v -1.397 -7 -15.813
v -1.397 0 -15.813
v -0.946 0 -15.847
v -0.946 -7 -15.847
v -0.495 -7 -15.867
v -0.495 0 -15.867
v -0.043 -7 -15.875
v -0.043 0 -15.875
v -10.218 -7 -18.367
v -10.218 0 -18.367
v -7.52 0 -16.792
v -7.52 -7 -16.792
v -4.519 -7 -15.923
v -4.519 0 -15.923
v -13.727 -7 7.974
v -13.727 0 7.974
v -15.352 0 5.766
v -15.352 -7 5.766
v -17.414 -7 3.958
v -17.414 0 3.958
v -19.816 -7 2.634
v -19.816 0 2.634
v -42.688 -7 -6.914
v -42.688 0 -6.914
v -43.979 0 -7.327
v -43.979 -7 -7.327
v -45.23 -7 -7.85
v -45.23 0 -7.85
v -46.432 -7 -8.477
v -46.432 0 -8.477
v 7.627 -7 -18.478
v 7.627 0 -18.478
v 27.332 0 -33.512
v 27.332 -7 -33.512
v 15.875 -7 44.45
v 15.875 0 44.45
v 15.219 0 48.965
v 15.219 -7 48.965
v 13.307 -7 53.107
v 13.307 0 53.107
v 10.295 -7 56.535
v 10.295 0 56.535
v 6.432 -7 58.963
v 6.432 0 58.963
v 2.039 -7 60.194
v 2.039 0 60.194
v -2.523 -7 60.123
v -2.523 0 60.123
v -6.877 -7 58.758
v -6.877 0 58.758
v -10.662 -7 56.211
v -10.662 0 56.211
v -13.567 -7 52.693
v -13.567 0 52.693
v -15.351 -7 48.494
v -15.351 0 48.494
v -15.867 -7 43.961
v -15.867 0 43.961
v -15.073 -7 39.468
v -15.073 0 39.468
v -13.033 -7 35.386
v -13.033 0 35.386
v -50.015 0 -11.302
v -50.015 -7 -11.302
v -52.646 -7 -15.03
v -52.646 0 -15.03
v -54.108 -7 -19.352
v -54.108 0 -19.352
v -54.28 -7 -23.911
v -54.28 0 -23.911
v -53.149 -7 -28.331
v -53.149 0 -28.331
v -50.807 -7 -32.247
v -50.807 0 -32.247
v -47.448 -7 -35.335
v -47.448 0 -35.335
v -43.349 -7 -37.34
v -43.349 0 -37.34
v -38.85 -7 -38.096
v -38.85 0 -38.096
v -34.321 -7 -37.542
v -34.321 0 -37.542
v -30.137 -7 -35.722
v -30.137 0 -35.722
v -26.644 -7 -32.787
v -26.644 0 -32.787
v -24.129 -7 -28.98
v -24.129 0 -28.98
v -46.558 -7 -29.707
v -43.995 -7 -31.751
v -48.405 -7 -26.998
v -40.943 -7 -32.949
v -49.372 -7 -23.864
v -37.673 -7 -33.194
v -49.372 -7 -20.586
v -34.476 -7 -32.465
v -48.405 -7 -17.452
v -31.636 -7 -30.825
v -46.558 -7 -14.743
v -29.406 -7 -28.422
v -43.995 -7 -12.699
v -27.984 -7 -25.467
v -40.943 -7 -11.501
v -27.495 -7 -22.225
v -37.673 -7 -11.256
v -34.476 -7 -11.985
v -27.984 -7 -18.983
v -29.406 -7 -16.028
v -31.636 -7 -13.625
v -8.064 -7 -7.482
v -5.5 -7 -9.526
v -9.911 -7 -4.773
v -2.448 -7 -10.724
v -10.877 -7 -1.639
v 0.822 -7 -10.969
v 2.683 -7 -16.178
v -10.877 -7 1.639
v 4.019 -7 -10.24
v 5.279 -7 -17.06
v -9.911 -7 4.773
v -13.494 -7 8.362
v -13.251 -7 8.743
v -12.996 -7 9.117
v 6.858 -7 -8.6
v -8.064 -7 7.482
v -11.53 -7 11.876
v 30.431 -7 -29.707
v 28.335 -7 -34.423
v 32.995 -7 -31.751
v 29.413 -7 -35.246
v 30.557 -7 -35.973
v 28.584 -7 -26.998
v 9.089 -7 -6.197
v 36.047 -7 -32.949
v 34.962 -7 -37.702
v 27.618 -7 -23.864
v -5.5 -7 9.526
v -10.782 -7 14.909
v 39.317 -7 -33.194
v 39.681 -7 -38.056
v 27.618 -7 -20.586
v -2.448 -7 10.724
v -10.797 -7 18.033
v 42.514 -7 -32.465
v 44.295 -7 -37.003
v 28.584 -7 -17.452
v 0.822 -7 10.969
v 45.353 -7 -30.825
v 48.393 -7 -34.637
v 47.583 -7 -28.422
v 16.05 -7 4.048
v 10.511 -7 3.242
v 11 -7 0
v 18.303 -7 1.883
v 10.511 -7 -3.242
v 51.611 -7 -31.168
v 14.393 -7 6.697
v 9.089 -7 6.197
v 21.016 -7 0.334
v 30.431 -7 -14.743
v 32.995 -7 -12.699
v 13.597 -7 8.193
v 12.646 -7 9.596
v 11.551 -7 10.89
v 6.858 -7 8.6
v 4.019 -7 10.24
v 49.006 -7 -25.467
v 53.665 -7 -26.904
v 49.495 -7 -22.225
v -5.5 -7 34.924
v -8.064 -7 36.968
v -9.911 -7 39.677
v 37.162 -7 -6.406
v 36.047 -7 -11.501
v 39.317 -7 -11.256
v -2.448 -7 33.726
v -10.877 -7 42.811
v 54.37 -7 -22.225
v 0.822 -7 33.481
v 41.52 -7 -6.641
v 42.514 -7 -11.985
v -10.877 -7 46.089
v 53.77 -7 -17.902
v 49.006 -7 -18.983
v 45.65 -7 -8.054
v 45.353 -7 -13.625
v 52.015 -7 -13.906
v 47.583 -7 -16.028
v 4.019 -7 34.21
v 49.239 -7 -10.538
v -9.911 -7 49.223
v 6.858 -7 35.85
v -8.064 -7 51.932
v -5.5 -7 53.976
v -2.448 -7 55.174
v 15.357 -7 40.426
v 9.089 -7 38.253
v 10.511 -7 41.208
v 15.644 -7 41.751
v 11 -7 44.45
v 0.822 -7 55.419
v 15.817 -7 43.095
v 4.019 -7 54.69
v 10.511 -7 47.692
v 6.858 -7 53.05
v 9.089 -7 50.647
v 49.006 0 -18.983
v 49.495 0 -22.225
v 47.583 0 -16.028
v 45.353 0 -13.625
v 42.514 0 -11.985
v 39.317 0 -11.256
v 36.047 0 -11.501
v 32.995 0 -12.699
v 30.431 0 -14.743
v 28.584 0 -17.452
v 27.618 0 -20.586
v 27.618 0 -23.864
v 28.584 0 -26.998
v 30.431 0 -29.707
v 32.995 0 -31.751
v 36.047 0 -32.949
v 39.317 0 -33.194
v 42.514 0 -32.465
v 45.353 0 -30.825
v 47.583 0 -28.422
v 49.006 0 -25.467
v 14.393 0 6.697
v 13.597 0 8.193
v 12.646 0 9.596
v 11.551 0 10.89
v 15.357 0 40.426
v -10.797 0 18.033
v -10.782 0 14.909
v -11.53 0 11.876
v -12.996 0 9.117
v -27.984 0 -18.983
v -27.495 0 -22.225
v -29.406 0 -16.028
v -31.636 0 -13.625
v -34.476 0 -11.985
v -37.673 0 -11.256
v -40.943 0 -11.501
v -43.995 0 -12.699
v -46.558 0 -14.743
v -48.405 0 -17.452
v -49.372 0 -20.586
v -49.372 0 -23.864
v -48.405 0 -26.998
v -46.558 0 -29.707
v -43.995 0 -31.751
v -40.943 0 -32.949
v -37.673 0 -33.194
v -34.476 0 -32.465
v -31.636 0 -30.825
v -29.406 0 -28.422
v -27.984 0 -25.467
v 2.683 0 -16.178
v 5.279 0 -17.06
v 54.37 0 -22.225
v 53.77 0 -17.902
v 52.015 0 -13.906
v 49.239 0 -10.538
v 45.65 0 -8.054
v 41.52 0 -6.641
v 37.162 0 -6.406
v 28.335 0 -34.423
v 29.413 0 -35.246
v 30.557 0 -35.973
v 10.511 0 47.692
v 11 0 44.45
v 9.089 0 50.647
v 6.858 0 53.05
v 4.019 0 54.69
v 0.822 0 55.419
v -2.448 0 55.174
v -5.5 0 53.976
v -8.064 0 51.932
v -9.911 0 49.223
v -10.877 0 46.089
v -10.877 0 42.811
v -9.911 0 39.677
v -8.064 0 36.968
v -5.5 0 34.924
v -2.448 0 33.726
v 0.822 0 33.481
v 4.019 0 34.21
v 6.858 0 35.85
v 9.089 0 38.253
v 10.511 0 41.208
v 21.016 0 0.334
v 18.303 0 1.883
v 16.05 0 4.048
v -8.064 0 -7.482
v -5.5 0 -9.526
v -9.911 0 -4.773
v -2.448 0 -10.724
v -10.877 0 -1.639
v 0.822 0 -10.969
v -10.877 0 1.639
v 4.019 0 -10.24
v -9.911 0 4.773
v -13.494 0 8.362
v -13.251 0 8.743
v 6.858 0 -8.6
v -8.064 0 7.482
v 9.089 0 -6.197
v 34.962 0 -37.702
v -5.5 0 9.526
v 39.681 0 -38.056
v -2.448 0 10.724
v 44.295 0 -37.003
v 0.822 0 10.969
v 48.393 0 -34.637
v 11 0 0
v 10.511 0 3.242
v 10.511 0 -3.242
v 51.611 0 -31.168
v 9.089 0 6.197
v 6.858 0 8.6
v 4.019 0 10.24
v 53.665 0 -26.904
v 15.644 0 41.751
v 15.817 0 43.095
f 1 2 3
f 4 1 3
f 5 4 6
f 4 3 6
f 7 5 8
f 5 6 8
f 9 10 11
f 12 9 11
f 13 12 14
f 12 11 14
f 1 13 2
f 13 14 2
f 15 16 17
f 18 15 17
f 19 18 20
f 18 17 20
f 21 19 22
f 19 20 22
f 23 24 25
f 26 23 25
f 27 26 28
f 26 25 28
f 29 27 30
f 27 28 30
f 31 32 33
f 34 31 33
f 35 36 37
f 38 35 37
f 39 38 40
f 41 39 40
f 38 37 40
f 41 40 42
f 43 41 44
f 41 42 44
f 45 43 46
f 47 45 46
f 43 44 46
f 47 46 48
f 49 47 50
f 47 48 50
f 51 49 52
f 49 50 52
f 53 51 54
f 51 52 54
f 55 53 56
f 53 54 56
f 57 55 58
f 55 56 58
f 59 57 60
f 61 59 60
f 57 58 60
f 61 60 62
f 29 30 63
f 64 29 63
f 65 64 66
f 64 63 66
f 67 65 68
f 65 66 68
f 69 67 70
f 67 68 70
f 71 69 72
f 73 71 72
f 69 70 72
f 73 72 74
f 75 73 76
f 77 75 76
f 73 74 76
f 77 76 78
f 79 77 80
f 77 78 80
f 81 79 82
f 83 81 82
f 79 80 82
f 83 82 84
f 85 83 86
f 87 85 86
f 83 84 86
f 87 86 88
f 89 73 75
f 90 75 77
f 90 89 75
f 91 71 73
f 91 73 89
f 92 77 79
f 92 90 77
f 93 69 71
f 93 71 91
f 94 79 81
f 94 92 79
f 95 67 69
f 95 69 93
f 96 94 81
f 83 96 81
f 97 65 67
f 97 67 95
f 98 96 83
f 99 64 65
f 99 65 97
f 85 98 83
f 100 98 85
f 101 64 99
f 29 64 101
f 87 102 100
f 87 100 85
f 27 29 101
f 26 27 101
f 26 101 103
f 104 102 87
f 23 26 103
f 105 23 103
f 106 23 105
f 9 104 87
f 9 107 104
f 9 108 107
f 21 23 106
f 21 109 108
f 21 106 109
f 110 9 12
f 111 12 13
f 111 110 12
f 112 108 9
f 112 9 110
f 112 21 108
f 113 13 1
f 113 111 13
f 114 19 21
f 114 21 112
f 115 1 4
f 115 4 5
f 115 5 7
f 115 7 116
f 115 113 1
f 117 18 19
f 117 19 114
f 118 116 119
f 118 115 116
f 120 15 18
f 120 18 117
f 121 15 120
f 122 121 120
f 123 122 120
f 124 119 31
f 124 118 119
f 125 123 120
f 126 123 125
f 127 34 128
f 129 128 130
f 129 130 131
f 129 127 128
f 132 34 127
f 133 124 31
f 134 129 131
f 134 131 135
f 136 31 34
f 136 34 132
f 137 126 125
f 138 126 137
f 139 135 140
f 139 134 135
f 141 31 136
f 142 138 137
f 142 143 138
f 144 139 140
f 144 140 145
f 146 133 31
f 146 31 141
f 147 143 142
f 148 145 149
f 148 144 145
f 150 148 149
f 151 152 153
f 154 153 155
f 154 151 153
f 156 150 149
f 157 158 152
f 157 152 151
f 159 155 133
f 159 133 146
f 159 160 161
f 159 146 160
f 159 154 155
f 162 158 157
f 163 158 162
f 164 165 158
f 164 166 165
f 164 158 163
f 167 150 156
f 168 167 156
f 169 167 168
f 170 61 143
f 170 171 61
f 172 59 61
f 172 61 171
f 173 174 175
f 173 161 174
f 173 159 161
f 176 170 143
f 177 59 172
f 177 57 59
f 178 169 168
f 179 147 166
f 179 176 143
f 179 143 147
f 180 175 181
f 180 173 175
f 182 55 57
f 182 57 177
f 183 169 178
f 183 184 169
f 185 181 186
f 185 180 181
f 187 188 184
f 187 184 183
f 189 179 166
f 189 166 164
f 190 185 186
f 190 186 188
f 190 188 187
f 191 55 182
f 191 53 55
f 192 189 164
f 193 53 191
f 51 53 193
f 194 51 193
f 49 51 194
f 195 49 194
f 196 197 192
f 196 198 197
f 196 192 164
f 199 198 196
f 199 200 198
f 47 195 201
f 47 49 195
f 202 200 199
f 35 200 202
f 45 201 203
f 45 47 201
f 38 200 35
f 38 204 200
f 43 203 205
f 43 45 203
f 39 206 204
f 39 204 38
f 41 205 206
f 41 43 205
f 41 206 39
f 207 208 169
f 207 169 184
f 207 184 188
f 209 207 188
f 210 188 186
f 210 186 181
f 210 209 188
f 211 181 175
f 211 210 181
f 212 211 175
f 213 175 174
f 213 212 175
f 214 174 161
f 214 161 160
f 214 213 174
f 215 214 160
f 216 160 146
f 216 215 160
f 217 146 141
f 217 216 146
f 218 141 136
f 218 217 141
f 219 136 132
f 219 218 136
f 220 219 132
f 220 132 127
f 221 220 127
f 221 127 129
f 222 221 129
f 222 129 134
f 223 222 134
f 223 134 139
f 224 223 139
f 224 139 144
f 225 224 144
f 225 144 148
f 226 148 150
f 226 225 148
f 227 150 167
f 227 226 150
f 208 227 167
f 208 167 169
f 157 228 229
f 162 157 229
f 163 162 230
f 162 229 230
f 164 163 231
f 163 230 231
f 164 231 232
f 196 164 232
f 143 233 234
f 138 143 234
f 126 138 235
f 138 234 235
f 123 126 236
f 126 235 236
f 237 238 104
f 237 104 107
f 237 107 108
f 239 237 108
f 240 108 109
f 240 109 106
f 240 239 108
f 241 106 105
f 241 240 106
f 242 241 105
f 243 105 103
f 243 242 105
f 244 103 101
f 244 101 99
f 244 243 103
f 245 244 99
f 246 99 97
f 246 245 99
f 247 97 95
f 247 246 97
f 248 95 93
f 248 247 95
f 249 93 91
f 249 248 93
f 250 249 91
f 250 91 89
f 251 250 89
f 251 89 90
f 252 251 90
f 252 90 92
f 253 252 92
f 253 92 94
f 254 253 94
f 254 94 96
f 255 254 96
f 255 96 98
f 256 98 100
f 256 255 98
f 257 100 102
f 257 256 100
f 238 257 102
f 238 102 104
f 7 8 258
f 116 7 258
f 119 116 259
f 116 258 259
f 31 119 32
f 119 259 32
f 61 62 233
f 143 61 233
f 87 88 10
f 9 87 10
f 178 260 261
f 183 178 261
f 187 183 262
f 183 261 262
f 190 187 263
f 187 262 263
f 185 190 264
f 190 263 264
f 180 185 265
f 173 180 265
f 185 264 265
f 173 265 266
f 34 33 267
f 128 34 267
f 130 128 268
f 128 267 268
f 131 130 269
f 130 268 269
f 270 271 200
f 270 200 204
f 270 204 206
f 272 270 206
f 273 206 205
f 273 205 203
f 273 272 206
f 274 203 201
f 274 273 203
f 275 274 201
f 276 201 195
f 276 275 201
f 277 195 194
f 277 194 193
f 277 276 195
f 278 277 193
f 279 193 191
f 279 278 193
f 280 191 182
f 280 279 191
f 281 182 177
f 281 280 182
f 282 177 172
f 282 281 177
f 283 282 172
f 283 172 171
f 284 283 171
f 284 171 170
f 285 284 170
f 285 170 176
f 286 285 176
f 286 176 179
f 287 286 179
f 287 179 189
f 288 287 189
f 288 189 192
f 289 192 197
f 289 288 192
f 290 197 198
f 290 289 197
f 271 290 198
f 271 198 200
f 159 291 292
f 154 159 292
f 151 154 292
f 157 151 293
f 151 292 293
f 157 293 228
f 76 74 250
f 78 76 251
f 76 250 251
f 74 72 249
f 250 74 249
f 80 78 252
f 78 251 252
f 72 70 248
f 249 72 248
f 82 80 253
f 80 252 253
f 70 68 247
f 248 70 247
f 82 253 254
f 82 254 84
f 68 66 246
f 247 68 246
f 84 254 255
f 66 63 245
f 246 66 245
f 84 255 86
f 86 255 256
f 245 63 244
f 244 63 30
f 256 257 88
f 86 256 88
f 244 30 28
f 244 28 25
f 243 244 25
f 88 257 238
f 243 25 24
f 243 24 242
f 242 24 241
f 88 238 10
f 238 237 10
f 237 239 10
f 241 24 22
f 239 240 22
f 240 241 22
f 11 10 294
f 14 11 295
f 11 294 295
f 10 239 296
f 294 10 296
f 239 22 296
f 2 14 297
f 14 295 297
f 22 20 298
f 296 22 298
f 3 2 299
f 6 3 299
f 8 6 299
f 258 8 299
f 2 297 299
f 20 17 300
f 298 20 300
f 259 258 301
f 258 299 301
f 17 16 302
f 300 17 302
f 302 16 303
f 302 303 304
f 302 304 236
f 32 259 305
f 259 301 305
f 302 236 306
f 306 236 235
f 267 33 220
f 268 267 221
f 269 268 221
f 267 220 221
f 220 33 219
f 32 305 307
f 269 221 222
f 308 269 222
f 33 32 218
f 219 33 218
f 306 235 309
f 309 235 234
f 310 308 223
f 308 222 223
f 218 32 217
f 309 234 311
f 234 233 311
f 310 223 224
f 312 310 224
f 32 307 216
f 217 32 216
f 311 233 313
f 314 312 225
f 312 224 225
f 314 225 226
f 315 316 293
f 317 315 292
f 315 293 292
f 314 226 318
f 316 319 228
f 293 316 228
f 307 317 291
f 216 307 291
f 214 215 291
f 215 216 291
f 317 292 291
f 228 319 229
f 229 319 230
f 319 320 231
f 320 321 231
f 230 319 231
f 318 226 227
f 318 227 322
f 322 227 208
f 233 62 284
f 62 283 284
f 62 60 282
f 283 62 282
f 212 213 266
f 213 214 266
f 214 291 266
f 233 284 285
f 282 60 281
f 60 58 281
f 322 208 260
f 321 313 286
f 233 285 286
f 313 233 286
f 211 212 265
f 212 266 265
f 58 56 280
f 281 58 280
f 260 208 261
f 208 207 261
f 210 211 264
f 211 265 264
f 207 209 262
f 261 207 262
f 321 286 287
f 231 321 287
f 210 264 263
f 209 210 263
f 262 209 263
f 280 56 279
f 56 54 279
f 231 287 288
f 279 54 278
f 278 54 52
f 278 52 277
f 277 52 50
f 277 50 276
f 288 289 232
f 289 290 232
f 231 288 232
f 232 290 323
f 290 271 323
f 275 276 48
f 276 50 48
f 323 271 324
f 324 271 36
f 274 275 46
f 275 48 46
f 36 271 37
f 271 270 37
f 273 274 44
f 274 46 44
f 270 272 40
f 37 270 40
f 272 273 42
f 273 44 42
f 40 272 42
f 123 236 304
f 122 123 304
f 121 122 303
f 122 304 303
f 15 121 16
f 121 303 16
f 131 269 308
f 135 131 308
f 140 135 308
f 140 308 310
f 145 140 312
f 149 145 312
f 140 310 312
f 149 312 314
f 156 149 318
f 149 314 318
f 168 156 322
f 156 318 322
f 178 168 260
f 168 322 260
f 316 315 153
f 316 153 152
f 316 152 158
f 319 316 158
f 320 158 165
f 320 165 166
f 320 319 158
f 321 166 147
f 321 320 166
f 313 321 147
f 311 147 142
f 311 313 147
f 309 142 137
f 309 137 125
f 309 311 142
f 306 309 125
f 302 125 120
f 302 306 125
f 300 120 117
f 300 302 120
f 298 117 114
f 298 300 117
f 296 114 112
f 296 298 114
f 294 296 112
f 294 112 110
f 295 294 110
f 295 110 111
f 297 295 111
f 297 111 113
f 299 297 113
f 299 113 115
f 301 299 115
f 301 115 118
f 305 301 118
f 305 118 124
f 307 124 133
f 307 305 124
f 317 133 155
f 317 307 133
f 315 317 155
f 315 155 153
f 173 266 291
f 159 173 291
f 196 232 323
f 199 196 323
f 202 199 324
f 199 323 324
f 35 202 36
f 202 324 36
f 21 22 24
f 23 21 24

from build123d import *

# Parameters (mm, degrees)
F0_R     = 11
F1_DEPTH = 7


with BuildPart() as f1:
    # F0 (on Front) → F1 (new body)
    with BuildSketch(Plane.XZ):
        with BuildLine():
            ThreePointArc((-10.218251, -18.367249), (-6.0466, -16.265091), (-1.397113, -15.813403))
            ThreePointArc((-1.397113, -15.813403), (-0.720579, -15.858638), (-0.04273, -15.874942))
            ThreePointArc((-0.04273, -15.874942), (4.004964, -16.548747), (7.626532, -18.478019))
            Line((7.626532, -18.478019), (27.331615, -33.512077))
            ThreePointArc((27.331615, -33.512077), (23.570998, -16.812529), (37.162239, -6.406025))
            Line((37.162239, -6.406025), (21.01563, 0.33436))
            ThreePointArc((21.01563, 0.33436), (17.109282, 2.896038), (14.393365, 6.696766))
            ThreePointArc((14.393365, 6.696766), (13.14047, 8.907506), (11.550893, 10.890019))
            Line((11.550893, 10.890019), (15.356507, 40.42591))
            ThreePointArc((15.356507, 40.42591), (2.774582, 28.819347), (-13.033335, 35.386457))
            Line((-13.033335, 35.386457), (-10.797377, 18.03289))
            ThreePointArc((-10.797377, 18.03289), (-11.062681, 13.369055), (-12.996251, 9.116638))
            ThreePointArc((-12.996251, 9.116638), (-13.373693, 8.553359), (-13.726738, 7.974477))
            ThreePointArc((-13.726738, 7.974477), (-16.334117, 4.805974), (-19.8157, 2.634241))
            Line((-19.8157, 2.634241), (-42.688118, -6.913832))
            ThreePointArc((-42.688118, -6.913832), (-28.86552, -9.603907), (-22.619828, -22.225002))
            ThreePointArc((-22.619828, -22.225002), (-23.001689, -25.685967), (-24.128902, -28.980429))
            Line((-24.128902, -28.980429), (-10.218251, -18.367249))
        make_face()
        Circle(F0_R, mode=Mode.SUBTRACT)
        with BuildLine():
            ThreePointArc((-46.432329, -8.476849), (-49.23868, -33.911972), (-24.128902, -28.980429))
            ThreePointArc((-24.128902, -28.980429), (-23.001689, -25.685967), (-22.619828, -22.225002))
            ThreePointArc((-22.619828, -22.225002), (-28.86552, -9.603907), (-42.688118, -6.913832))
            Line((-42.688118, -6.913832), (-46.432329, -8.476849))
        make_face()
        with Locations((-38.494828, -22.225002)):
            Circle(F0_R, mode=Mode.SUBTRACT)
        with BuildLine():
            ThreePointArc((37.162239, -6.406025), (23.570998, -16.812529), (27.331615, -33.512077))
            Line((27.331615, -33.512077), (30.557333, -35.97315))
            ThreePointArc((30.557333, -35.97315), (46.432333, -35.973148), (54.369832, -22.224996))
            ThreePointArc((54.369832, -22.224996), (49.238684, -10.538026), (37.162239, -6.406025))
        make_face()
        with Locations((38.494832, -22.224996)):
            Circle(F0_R, mode=Mode.SUBTRACT)
        with BuildLine():
            Line((30.557333, -35.97315), (27.331615, -33.512077))
            ThreePointArc((27.331615, -33.512077), (28.865525, -34.846092), (30.557333, -35.97315))
        make_face()
        with BuildLine():
            ThreePointArc((-42.688118, -6.913832), (-44.610364, -7.575229), (-46.432329, -8.476849))
            Line((-46.432329, -8.476849), (-42.688118, -6.913832))
        make_face()
        with BuildLine():
            Line((15.875, 44.45), (15.356507, 40.42591))
            ThreePointArc((15.356507, 40.42591), (15.744843, 42.421322), (15.875, 44.45))
        make_face()
        with BuildLine():
            ThreePointArc((-13.033335, 35.386457), (2.774582, 28.819347), (15.356507, 40.42591))
            Line((15.356507, 40.42591), (15.875, 44.45))
            ThreePointArc((15.875, 44.45), (-4.749286, 59.597934), (-13.033335, 35.386457))
        make_face()
        with Locations((0, 44.45)):
            Circle(F0_R, mode=Mode.SUBTRACT)
    extrude(amount=F1_DEPTH)


solid = f1.part
